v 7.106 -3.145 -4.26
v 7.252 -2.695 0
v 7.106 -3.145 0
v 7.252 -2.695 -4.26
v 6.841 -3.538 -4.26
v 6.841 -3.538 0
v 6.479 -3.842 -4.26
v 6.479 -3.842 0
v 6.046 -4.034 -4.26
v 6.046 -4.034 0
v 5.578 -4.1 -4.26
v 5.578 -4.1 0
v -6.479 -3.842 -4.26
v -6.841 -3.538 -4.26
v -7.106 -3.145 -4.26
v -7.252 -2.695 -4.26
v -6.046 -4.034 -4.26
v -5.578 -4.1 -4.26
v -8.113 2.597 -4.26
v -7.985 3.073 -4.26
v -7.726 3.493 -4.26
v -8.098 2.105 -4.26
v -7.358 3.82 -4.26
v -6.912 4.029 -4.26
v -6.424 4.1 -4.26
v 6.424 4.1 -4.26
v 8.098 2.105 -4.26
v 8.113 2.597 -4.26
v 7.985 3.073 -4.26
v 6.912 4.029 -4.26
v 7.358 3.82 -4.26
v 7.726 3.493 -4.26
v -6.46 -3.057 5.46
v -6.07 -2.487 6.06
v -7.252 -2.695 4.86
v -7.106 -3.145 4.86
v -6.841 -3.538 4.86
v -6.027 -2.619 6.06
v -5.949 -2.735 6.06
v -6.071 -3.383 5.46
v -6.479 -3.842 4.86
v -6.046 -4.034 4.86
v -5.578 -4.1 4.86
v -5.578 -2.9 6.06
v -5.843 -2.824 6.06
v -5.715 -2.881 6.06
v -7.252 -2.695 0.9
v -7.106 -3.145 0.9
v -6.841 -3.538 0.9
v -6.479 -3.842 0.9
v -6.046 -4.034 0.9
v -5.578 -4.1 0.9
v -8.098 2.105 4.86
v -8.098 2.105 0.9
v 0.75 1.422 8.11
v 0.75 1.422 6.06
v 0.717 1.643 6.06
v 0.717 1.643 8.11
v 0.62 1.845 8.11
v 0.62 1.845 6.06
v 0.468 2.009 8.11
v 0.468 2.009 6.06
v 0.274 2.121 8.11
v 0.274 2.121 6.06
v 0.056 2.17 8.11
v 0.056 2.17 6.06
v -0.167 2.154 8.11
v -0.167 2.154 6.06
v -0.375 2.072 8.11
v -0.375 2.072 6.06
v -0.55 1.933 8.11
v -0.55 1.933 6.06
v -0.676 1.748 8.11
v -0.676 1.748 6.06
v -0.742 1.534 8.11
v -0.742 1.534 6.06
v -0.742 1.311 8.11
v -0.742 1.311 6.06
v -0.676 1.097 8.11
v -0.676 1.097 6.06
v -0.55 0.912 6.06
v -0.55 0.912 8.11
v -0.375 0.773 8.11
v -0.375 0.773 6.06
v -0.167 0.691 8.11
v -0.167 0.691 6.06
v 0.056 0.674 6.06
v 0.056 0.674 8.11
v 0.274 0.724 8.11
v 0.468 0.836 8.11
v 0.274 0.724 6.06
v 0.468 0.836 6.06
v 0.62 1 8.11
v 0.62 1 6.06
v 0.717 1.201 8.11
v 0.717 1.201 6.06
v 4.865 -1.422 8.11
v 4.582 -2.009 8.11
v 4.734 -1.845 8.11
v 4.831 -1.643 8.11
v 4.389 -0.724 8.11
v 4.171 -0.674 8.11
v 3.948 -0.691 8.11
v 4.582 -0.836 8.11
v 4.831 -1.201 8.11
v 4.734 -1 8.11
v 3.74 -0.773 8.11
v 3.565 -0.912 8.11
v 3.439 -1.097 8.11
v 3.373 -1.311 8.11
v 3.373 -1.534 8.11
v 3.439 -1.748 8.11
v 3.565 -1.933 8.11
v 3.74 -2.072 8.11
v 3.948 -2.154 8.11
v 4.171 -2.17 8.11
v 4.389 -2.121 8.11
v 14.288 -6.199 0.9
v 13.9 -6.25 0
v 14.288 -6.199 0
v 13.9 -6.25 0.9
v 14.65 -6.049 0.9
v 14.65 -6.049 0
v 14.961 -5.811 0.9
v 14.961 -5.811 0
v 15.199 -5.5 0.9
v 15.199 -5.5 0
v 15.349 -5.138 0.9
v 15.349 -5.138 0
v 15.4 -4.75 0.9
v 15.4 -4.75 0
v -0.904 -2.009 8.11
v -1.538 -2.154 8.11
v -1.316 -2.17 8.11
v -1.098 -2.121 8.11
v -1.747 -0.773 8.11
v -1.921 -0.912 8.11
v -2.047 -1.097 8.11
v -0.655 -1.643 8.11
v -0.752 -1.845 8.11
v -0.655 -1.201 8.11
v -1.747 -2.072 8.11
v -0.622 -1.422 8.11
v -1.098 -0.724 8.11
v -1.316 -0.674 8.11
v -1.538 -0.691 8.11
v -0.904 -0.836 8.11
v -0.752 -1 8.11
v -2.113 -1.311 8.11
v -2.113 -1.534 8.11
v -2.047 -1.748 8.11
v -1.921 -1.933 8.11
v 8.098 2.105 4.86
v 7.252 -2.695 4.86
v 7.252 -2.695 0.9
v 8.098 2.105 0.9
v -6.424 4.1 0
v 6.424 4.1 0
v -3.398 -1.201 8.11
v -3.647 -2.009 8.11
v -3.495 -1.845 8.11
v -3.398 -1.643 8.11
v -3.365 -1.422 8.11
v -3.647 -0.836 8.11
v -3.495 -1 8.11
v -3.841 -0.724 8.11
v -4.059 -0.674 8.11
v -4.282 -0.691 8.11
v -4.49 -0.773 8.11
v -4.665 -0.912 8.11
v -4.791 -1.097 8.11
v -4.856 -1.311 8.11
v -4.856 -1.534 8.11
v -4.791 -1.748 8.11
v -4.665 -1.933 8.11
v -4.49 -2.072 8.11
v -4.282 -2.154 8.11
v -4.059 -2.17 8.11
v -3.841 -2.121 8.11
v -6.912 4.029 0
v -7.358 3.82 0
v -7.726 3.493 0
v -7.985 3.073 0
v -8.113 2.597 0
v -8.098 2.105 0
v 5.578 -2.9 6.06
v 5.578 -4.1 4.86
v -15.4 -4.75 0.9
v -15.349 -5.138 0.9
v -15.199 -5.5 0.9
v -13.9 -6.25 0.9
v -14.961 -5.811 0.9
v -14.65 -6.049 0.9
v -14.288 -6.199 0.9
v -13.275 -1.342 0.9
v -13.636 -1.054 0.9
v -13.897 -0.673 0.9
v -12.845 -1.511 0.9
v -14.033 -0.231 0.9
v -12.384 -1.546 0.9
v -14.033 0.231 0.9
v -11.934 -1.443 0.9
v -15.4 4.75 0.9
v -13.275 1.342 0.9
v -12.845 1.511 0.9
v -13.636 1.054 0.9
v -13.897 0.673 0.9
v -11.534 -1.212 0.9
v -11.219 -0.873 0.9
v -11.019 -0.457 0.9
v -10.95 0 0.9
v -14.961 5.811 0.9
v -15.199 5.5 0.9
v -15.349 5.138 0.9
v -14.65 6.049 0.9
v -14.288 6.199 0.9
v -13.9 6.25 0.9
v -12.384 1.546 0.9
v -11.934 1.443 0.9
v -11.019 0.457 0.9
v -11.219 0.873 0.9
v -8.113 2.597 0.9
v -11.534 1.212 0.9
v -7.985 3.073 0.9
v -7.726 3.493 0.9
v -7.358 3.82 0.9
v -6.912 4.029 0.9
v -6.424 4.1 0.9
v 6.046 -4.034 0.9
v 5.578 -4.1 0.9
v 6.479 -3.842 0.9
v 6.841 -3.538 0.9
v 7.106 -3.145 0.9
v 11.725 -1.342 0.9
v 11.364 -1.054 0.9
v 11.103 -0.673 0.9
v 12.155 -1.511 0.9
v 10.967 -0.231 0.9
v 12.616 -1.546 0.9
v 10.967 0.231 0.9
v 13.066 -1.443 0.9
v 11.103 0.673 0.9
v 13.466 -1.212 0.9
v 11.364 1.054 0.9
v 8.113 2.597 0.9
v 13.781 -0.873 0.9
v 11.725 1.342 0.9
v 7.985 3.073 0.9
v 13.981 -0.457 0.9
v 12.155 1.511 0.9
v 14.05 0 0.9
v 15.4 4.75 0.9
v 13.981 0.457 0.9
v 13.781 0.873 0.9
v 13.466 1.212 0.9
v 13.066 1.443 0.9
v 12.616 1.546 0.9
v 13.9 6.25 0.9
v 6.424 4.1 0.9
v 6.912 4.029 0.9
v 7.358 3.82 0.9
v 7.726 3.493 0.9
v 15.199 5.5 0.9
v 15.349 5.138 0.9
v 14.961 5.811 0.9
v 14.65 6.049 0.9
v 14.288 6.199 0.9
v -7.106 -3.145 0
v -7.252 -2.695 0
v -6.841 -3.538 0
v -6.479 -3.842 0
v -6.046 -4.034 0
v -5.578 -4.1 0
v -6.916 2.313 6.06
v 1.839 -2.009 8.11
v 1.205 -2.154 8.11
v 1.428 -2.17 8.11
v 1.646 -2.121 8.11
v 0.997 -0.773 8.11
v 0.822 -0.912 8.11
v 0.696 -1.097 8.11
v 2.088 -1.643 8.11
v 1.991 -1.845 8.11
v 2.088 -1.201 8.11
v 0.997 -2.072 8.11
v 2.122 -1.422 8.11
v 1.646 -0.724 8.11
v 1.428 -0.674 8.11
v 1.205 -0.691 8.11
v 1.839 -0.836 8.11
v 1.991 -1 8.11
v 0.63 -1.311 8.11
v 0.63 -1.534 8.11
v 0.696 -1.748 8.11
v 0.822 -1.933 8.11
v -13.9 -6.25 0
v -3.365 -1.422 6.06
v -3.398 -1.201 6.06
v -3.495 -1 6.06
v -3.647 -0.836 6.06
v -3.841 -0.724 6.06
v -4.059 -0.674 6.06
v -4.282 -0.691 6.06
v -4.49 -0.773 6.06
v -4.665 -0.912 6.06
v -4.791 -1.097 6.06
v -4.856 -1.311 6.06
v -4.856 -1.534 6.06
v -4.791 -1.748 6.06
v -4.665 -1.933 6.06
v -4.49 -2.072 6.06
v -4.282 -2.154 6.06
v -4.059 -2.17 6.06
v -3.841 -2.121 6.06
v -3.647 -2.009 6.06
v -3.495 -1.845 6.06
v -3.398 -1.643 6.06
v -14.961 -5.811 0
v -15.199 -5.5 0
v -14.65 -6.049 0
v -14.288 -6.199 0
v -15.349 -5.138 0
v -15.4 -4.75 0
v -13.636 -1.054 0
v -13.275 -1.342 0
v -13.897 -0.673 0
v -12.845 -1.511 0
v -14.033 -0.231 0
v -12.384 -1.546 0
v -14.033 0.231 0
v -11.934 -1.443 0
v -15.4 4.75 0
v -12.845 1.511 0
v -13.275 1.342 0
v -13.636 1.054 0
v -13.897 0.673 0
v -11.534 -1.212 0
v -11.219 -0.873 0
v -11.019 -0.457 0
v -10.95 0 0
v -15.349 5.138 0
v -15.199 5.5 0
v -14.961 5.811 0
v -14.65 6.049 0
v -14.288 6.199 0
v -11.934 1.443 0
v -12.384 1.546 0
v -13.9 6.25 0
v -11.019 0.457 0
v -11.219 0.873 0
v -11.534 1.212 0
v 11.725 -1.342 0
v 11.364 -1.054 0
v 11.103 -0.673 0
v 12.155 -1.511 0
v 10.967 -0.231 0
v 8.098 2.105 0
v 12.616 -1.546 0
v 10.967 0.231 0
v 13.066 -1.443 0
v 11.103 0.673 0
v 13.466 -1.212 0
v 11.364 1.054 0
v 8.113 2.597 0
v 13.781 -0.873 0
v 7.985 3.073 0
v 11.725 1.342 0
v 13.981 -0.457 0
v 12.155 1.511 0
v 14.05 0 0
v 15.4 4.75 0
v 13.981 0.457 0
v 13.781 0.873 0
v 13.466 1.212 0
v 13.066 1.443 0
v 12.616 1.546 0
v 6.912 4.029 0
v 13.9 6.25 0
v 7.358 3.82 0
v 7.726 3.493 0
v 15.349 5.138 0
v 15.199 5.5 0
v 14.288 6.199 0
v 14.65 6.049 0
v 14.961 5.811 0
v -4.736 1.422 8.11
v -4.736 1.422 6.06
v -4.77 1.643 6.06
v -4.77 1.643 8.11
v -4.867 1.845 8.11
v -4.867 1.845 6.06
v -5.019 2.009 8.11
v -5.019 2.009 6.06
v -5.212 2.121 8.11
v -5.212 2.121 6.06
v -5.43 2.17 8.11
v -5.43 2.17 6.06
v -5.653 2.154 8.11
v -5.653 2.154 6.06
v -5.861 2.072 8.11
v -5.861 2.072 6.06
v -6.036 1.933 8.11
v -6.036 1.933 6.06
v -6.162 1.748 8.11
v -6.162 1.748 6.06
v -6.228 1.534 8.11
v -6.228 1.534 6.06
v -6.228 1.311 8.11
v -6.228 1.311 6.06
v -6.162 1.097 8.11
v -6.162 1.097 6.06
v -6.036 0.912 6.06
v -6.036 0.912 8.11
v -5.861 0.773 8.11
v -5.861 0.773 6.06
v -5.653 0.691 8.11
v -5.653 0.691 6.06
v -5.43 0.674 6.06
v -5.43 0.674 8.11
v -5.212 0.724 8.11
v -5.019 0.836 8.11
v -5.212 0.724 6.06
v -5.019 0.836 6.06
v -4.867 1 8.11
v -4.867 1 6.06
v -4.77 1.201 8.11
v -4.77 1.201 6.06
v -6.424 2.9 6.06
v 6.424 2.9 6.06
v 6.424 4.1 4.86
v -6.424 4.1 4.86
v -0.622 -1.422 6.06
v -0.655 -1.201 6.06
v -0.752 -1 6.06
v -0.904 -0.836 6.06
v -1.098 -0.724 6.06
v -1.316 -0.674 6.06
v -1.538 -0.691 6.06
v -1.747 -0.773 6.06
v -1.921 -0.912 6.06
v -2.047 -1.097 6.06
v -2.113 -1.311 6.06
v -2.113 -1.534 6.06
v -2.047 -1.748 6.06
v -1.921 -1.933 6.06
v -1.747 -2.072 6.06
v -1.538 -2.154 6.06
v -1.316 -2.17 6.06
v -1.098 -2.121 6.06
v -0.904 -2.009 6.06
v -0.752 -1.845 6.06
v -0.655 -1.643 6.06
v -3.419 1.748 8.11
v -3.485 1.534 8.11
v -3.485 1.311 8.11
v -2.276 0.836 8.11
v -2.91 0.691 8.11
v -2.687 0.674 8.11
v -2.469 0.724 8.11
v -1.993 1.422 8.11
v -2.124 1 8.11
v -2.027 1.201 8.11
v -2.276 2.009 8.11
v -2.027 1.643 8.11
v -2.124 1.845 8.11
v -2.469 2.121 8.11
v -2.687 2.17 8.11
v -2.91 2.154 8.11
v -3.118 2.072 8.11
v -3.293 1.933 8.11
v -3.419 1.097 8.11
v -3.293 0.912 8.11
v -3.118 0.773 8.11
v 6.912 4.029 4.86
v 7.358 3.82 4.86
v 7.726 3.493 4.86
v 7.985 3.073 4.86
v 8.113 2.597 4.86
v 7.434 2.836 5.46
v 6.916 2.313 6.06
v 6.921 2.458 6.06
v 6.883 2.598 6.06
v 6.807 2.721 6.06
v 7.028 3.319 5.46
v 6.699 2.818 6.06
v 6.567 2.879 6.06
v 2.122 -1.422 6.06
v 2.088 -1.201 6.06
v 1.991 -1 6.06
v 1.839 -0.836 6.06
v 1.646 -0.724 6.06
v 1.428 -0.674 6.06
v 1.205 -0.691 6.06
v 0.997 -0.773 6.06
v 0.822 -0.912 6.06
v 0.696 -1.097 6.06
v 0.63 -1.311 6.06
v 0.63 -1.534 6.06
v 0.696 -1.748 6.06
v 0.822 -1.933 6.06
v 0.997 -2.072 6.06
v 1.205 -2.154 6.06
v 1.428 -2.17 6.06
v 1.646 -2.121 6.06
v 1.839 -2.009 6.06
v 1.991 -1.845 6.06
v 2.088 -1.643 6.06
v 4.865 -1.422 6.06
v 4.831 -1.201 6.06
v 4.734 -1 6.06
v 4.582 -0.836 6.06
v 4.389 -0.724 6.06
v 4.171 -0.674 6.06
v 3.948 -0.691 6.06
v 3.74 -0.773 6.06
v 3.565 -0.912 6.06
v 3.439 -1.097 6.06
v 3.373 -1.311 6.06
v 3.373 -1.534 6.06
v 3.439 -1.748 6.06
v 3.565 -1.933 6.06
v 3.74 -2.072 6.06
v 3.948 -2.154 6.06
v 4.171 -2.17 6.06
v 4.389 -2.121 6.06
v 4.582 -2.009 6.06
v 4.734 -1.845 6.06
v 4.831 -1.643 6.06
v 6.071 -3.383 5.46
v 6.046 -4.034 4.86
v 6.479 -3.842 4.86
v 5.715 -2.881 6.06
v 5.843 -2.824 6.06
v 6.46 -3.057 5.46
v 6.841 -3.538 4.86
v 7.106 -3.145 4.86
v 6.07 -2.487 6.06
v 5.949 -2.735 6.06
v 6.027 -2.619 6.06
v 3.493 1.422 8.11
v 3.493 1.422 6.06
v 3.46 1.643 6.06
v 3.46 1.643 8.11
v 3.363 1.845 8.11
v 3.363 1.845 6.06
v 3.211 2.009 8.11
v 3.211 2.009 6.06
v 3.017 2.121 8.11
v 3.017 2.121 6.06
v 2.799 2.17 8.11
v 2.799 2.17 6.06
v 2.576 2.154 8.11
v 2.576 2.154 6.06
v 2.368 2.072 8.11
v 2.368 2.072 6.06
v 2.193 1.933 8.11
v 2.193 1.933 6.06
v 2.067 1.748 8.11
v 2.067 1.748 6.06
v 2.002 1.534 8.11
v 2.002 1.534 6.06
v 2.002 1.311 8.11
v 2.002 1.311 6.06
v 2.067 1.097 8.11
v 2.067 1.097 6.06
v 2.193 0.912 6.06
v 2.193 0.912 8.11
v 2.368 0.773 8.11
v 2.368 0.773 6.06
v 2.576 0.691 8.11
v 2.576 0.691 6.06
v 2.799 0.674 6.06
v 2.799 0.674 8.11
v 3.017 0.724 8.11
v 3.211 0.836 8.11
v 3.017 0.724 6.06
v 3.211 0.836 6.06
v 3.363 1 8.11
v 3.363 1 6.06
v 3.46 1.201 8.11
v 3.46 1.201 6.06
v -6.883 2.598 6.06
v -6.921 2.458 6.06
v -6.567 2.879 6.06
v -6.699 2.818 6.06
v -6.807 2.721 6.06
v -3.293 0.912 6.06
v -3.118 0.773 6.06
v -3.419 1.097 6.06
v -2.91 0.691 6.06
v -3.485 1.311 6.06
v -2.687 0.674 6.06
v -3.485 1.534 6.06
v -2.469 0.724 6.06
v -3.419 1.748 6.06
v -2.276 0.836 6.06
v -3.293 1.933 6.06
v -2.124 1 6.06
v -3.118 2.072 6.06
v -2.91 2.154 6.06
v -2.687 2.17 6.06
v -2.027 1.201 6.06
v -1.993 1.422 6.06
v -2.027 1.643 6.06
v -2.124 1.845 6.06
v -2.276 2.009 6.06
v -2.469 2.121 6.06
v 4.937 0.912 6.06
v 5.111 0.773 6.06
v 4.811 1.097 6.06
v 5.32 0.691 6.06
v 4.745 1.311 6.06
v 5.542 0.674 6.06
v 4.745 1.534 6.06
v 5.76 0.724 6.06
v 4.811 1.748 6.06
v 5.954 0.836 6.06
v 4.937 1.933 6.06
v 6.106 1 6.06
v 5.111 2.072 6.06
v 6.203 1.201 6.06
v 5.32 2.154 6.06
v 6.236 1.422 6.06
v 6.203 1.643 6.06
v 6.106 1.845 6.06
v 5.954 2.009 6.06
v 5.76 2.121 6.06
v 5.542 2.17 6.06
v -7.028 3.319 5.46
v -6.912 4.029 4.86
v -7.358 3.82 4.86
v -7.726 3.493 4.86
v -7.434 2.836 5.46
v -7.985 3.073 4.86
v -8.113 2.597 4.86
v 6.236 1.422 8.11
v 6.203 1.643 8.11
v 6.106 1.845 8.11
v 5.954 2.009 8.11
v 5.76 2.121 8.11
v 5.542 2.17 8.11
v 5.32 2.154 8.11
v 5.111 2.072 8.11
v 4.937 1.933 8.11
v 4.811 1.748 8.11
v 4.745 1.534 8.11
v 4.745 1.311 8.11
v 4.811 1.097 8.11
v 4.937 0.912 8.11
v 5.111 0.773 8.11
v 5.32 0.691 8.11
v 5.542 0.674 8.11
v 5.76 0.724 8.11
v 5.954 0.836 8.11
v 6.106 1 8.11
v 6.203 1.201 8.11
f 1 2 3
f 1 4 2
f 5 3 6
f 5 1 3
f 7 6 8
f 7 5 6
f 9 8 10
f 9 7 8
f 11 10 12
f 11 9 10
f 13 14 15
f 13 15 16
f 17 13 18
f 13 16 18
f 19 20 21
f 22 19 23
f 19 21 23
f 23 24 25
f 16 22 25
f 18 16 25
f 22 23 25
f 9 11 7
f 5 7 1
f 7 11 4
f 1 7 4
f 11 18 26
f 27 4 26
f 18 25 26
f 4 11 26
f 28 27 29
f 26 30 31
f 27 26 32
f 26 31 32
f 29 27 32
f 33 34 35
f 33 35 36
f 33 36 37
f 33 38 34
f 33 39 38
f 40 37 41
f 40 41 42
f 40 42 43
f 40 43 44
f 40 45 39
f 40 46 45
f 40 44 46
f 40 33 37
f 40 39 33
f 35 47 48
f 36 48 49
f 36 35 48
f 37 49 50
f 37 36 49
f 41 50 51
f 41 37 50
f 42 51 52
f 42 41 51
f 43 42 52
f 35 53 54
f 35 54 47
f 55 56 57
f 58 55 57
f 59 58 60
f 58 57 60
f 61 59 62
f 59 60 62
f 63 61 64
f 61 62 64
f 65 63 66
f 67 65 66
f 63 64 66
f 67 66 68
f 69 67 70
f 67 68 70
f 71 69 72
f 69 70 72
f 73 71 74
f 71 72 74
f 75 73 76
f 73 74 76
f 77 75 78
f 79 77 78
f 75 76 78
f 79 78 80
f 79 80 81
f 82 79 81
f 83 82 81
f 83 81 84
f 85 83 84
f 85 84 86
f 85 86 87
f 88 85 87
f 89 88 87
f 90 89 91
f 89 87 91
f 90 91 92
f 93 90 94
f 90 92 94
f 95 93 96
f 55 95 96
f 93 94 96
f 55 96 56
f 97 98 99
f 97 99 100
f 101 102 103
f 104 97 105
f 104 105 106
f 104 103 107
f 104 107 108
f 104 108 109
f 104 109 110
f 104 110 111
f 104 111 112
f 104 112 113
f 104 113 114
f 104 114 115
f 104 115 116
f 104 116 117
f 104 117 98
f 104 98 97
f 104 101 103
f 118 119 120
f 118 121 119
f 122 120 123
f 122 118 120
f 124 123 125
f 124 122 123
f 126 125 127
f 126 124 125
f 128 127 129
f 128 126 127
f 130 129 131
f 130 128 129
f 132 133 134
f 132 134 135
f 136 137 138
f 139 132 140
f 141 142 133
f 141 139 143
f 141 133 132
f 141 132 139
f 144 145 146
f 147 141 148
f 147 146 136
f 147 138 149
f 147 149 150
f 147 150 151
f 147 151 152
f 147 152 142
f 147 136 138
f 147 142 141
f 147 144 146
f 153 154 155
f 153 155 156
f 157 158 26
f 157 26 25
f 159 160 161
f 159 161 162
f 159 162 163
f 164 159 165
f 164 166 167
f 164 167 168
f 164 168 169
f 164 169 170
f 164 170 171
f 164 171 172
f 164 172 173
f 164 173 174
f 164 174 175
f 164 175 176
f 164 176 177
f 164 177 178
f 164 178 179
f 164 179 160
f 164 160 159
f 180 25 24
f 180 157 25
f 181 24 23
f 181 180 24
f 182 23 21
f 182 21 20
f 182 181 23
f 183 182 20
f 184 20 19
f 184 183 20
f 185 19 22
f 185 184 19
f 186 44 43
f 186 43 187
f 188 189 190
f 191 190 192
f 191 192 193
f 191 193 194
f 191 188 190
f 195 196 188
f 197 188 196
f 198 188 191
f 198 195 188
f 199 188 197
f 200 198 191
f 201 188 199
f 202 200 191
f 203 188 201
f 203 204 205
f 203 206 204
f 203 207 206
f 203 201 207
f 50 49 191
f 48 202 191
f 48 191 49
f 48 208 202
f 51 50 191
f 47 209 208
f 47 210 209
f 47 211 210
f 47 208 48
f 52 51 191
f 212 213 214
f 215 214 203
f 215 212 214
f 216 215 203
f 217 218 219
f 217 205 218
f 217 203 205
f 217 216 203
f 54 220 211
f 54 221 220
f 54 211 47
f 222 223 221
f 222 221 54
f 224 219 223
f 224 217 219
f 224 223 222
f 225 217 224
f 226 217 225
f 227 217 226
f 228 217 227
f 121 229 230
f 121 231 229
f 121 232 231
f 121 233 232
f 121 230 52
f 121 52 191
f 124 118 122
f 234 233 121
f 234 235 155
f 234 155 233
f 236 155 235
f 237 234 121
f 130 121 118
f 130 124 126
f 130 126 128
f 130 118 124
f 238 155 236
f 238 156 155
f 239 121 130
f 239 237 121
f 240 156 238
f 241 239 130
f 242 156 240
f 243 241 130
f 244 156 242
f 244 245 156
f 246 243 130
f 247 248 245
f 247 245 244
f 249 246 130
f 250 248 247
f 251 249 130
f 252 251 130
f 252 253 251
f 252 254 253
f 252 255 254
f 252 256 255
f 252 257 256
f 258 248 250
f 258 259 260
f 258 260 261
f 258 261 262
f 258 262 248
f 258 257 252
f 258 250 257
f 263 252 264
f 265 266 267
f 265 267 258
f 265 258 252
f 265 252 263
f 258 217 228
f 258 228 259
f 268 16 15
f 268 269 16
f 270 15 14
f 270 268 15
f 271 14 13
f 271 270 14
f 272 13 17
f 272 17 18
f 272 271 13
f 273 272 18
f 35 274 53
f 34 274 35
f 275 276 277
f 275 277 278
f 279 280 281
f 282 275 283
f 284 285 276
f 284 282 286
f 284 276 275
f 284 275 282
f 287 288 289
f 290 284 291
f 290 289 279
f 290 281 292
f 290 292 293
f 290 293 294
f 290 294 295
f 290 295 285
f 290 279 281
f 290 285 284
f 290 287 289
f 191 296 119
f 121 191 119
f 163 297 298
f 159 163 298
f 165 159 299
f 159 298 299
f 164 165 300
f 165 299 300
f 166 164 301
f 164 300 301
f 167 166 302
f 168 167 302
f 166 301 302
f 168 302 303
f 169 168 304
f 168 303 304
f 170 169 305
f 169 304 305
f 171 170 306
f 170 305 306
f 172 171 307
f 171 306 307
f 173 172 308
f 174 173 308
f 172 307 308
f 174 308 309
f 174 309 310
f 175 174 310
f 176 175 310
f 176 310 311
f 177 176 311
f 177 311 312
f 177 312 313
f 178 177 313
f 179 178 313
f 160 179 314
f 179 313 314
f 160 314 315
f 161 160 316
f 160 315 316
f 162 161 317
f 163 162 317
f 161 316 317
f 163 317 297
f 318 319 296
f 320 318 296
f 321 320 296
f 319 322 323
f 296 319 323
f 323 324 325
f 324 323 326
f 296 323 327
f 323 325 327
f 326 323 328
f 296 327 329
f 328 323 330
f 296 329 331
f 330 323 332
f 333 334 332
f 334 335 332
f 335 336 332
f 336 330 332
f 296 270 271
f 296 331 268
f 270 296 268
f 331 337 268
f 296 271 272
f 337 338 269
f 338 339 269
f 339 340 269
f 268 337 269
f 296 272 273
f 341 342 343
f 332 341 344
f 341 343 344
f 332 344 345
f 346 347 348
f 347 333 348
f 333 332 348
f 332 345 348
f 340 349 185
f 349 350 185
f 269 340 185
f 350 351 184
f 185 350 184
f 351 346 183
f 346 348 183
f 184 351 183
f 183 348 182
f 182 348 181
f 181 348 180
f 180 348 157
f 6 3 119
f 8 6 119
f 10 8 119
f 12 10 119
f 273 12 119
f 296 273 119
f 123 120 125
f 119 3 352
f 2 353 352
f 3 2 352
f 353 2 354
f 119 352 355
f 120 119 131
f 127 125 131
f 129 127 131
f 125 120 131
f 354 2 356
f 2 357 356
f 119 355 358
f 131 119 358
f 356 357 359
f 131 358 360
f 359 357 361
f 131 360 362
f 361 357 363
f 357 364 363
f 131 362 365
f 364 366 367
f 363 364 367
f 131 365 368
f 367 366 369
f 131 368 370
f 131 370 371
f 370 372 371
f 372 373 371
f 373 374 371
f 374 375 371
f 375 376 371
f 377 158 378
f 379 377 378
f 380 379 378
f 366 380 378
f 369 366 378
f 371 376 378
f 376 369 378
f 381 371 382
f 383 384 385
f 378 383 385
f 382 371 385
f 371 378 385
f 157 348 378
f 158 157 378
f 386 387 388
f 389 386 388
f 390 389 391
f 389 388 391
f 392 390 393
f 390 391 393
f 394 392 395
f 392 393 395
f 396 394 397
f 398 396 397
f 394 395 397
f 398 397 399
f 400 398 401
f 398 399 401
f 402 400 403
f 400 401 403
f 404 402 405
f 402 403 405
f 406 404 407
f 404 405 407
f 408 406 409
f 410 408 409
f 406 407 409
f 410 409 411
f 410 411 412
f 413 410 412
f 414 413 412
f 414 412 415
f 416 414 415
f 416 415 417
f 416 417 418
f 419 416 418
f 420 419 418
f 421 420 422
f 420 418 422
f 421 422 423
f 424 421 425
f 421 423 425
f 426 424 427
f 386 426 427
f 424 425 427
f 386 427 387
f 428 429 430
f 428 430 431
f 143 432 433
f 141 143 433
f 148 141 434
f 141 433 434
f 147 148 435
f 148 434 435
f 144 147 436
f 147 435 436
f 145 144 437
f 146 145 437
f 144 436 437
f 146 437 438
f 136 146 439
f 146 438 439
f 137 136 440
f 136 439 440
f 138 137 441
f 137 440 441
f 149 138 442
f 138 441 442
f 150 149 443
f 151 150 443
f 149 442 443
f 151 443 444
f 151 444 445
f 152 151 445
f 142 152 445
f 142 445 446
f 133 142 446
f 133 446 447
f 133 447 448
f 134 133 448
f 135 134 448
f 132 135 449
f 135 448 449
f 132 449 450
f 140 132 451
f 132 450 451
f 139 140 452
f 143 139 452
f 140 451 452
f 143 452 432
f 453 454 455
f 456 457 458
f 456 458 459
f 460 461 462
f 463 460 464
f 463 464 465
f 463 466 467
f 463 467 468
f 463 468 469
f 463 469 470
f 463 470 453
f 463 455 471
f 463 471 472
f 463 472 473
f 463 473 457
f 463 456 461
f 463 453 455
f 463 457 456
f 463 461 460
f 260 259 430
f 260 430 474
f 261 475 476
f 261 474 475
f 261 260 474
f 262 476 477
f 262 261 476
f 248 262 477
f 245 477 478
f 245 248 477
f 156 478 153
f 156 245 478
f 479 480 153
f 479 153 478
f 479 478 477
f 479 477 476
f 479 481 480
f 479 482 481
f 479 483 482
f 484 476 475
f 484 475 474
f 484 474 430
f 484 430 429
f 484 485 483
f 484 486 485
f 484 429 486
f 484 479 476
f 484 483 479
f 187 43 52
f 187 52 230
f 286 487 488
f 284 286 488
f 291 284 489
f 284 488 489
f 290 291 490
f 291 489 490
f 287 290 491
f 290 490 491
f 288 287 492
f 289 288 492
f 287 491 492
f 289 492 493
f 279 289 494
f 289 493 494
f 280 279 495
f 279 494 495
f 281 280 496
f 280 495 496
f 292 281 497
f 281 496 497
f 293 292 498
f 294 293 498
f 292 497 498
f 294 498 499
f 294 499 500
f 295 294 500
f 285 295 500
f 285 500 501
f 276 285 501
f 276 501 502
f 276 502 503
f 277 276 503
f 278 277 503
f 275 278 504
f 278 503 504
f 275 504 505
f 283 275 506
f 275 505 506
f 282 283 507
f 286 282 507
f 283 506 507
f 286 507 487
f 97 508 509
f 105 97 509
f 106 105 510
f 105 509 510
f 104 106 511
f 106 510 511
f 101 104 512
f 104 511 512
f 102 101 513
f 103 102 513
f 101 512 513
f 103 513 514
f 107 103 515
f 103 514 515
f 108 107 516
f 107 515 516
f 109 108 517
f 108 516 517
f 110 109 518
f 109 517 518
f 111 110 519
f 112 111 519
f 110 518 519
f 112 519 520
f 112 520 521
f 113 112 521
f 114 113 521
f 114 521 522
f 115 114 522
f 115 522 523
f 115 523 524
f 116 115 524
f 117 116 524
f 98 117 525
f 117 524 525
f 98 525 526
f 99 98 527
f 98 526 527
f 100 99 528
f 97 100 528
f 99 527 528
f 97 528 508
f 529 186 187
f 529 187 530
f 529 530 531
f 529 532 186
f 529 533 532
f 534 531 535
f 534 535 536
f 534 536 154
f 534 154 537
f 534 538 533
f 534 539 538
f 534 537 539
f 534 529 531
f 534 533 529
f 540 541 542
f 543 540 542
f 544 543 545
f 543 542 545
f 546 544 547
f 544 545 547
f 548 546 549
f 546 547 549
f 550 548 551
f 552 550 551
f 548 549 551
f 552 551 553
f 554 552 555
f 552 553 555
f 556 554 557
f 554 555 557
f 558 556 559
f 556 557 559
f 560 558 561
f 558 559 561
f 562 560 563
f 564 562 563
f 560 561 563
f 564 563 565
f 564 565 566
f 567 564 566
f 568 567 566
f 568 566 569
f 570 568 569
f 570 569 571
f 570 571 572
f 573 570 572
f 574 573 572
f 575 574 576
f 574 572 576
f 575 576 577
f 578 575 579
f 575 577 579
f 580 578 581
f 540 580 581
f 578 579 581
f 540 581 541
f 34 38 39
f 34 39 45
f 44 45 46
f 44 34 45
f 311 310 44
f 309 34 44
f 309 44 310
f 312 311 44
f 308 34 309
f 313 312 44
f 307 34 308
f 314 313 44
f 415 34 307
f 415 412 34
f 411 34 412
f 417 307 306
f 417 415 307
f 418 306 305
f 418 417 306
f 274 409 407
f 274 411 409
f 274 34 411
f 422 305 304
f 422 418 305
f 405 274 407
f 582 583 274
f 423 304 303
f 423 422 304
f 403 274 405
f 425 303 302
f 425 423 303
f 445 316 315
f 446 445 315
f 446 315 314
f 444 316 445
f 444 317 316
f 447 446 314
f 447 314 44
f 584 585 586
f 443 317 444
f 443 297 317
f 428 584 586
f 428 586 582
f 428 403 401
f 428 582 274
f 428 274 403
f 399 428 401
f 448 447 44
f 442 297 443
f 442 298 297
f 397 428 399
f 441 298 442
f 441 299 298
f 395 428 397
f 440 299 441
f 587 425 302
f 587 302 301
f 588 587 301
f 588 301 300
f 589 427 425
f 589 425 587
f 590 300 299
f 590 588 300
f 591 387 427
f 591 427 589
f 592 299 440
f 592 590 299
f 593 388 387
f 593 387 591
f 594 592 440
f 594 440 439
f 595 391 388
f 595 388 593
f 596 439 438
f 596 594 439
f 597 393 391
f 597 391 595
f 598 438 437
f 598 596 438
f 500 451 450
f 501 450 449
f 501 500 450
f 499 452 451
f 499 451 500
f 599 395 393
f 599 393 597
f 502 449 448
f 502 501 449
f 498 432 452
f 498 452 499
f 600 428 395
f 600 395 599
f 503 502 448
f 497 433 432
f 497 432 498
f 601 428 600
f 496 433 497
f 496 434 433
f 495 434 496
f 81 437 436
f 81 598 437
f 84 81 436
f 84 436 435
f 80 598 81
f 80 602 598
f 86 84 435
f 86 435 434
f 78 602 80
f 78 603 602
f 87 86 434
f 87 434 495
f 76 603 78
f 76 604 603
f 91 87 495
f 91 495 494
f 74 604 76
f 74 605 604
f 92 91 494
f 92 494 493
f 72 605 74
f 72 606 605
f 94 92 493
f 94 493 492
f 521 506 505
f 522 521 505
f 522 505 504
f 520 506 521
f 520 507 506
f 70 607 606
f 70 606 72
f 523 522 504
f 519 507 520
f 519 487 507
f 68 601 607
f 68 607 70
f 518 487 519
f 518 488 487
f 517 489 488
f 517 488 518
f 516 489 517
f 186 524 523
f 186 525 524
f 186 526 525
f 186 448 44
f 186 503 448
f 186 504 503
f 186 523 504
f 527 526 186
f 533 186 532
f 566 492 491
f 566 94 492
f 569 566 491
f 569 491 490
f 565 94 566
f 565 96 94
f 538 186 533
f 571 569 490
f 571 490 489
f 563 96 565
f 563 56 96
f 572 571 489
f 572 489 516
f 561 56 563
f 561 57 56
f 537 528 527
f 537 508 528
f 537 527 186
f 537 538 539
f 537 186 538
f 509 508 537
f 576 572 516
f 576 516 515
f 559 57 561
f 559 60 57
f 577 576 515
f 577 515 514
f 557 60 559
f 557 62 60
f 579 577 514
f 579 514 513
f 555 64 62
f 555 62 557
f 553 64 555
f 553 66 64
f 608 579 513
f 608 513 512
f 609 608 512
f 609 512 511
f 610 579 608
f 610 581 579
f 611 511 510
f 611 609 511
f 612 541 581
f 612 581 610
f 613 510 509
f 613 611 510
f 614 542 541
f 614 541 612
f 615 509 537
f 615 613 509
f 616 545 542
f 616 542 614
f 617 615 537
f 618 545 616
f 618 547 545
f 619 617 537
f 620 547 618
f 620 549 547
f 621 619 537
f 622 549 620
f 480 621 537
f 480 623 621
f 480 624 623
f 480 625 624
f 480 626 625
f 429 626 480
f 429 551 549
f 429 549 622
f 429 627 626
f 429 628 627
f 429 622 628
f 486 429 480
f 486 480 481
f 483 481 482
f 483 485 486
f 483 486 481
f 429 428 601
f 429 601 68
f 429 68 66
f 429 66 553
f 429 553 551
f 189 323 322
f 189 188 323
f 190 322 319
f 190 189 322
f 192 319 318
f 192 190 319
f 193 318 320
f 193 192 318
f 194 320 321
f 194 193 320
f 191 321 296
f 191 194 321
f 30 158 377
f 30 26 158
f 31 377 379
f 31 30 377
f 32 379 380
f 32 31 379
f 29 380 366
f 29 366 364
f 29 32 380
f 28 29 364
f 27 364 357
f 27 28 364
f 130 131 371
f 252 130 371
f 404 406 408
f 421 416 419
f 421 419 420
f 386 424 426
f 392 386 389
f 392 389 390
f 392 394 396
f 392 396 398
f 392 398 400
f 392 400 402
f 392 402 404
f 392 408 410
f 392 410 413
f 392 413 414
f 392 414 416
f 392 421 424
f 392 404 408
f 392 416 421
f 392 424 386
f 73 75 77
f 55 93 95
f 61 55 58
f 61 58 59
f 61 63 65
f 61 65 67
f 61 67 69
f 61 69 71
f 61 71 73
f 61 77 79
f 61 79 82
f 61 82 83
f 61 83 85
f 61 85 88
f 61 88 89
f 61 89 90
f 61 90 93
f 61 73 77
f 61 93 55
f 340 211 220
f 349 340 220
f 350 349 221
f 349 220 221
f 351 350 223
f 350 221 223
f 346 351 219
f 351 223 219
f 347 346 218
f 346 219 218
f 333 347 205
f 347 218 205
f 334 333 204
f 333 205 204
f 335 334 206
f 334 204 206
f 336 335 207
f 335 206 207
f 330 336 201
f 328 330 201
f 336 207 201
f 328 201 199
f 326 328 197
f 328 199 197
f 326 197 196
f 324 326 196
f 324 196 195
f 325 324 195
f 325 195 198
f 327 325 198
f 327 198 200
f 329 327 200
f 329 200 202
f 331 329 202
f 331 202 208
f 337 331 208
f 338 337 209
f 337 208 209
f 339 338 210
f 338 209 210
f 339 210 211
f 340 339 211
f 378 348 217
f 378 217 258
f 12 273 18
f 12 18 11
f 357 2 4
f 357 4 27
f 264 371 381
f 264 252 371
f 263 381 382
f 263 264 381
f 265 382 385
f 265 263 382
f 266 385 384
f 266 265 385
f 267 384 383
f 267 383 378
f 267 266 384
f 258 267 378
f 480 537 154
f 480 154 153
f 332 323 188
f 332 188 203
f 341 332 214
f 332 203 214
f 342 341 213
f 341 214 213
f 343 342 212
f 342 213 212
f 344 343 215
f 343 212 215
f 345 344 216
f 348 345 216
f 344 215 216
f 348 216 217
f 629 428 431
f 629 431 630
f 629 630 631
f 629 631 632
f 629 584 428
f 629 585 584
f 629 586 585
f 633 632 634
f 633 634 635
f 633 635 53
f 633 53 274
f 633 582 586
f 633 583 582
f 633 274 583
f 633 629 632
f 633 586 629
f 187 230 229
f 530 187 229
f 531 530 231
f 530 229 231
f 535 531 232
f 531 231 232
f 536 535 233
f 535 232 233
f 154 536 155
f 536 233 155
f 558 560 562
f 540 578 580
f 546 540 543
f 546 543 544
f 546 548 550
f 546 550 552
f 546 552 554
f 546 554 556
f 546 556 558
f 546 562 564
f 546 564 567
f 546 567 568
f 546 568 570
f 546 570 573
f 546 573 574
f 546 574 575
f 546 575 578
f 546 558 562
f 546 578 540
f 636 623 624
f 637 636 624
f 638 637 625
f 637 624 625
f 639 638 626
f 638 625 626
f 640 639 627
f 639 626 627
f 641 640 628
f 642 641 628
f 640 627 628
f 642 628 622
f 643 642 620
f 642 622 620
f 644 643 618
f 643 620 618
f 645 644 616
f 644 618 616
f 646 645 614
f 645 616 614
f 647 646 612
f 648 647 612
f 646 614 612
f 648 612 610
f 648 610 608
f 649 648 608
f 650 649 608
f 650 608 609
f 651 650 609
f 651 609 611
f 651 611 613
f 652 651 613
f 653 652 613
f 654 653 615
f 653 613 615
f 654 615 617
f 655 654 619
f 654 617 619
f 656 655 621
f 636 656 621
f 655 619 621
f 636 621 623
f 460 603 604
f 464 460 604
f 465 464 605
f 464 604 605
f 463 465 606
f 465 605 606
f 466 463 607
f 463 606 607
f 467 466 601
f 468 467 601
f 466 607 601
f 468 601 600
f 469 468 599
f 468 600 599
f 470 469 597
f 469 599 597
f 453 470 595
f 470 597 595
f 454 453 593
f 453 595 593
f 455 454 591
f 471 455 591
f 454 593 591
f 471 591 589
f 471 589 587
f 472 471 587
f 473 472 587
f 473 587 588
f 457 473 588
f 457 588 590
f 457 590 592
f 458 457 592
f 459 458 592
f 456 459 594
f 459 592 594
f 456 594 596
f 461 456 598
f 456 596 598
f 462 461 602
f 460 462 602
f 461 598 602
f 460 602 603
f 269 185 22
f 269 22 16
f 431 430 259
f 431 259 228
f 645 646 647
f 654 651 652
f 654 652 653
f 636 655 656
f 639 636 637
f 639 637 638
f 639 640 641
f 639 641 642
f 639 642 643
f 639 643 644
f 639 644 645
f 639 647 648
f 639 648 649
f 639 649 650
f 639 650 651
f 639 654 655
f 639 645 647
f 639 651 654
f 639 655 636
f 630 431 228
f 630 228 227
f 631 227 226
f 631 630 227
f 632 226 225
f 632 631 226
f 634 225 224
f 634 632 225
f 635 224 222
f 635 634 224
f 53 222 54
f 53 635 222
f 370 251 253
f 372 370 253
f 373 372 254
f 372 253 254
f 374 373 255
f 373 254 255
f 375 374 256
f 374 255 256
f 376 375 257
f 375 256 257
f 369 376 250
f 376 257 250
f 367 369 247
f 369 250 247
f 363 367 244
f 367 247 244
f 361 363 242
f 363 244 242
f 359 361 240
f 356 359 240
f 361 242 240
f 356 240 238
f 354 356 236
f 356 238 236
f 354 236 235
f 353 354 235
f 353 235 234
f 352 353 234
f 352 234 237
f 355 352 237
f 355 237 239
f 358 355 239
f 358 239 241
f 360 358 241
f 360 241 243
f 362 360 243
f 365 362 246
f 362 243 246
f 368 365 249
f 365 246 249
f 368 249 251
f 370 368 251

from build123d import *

# Parameters (mm, degrees)
F0_W      = 30.8
F0_H      = 12.5
F1_DEPTH  = 0.9
F2_R      = 1.5
F4_DEPTH  = 5.16
F5_R      = 1.7
F6_SIZE   = 1.2
F7_R      = 0.75
F8_DEPTH  = 2.05
F9_R      = 1.55
F10_DEPTH = 0.9


with BuildPart() as f1:
    # F0 (on Top) → F1 (new body)
    with BuildSketch(Plane.XY):
        Rectangle(F0_W, F0_H)
    extrude(amount=F1_DEPTH)

    # F2
    f2_edges = [f1.edges().sort_by_distance(p)[0] for p in [
        (-15.4, 6.25, 0.45),
        (15.4, 6.25, 0.45),
        (15.4, -6.25, 0.45),
        (-15.4, -6.25, 0.45),
    ]]
    fillet(f2_edges, radius=F2_R)

    # F3 (on face) → F4 (join, symmetric)
    with BuildSketch(Plane.XY.offset(0.9)):
        Polygon((8.45, 4.1), (-8.45, 4.1), (-7.0041187582, -4.1), (7.0041187582, -4.1), align=None)
    extrude(amount=F4_DEPTH, both=True)

    # F5
    f5_edges = [f1.edges().sort_by_distance(p)[0] for p in [
        (-8.45, 4.1, -2.13),
        (-8.45, 4.1, 3.48),
        (8.45, 4.1, -2.13),
        (8.45, 4.1, 3.48),
        (-7.004119, -4.1, -2.13),
        (-7.004119, -4.1, 3.48),
        (7.004119, -4.1, -2.13),
        (7.004119, -4.1, 3.48),
    ]]
    fillet(f5_edges, radius=F5_R)

    # F6
    f6_edges = [f1.edges().sort_by_distance(p)[0] for p in [
        (0, 4.1, 6.06),
    ]]
    chamfer(f6_edges, length=F6_SIZE)

    # F7 (on face) → F8 (join)
    with BuildSketch(Plane.XY.offset(6.06)):
        with Locations((-5.4864, 1.4224)):
            Circle(F7_R)
        with Locations((-2.7432, 1.4224)):
            Circle(F7_R)
        with Locations((0, 1.4224)):
            Circle(F7_R)
        with Locations((2.7432, 1.4224)):
            Circle(F7_R)
        with Locations((5.4864, 1.4224)):
            Circle(F7_R)
        with Locations((4.1148, -1.4224)):
            Circle(F7_R)
        with Locations((1.3716, -1.4224)):
            Circle(F7_R)
        with Locations((-1.3716, -1.4224)):
            Circle(F7_R)
        with Locations((-4.1148, -1.4224)):
            Circle(F7_R)
    extrude(amount=F8_DEPTH)

    # F9 (on face) → F10 (cut)
    with BuildSketch(Plane.XY.offset(0.9)):
        with Locations((-12.5, 0)):
            Circle(F9_R)
        with Locations((12.5, 0)):
            Circle(F9_R)
    extrude(amount=-F10_DEPTH, mode=Mode.SUBTRACT)


solid = f1.part
